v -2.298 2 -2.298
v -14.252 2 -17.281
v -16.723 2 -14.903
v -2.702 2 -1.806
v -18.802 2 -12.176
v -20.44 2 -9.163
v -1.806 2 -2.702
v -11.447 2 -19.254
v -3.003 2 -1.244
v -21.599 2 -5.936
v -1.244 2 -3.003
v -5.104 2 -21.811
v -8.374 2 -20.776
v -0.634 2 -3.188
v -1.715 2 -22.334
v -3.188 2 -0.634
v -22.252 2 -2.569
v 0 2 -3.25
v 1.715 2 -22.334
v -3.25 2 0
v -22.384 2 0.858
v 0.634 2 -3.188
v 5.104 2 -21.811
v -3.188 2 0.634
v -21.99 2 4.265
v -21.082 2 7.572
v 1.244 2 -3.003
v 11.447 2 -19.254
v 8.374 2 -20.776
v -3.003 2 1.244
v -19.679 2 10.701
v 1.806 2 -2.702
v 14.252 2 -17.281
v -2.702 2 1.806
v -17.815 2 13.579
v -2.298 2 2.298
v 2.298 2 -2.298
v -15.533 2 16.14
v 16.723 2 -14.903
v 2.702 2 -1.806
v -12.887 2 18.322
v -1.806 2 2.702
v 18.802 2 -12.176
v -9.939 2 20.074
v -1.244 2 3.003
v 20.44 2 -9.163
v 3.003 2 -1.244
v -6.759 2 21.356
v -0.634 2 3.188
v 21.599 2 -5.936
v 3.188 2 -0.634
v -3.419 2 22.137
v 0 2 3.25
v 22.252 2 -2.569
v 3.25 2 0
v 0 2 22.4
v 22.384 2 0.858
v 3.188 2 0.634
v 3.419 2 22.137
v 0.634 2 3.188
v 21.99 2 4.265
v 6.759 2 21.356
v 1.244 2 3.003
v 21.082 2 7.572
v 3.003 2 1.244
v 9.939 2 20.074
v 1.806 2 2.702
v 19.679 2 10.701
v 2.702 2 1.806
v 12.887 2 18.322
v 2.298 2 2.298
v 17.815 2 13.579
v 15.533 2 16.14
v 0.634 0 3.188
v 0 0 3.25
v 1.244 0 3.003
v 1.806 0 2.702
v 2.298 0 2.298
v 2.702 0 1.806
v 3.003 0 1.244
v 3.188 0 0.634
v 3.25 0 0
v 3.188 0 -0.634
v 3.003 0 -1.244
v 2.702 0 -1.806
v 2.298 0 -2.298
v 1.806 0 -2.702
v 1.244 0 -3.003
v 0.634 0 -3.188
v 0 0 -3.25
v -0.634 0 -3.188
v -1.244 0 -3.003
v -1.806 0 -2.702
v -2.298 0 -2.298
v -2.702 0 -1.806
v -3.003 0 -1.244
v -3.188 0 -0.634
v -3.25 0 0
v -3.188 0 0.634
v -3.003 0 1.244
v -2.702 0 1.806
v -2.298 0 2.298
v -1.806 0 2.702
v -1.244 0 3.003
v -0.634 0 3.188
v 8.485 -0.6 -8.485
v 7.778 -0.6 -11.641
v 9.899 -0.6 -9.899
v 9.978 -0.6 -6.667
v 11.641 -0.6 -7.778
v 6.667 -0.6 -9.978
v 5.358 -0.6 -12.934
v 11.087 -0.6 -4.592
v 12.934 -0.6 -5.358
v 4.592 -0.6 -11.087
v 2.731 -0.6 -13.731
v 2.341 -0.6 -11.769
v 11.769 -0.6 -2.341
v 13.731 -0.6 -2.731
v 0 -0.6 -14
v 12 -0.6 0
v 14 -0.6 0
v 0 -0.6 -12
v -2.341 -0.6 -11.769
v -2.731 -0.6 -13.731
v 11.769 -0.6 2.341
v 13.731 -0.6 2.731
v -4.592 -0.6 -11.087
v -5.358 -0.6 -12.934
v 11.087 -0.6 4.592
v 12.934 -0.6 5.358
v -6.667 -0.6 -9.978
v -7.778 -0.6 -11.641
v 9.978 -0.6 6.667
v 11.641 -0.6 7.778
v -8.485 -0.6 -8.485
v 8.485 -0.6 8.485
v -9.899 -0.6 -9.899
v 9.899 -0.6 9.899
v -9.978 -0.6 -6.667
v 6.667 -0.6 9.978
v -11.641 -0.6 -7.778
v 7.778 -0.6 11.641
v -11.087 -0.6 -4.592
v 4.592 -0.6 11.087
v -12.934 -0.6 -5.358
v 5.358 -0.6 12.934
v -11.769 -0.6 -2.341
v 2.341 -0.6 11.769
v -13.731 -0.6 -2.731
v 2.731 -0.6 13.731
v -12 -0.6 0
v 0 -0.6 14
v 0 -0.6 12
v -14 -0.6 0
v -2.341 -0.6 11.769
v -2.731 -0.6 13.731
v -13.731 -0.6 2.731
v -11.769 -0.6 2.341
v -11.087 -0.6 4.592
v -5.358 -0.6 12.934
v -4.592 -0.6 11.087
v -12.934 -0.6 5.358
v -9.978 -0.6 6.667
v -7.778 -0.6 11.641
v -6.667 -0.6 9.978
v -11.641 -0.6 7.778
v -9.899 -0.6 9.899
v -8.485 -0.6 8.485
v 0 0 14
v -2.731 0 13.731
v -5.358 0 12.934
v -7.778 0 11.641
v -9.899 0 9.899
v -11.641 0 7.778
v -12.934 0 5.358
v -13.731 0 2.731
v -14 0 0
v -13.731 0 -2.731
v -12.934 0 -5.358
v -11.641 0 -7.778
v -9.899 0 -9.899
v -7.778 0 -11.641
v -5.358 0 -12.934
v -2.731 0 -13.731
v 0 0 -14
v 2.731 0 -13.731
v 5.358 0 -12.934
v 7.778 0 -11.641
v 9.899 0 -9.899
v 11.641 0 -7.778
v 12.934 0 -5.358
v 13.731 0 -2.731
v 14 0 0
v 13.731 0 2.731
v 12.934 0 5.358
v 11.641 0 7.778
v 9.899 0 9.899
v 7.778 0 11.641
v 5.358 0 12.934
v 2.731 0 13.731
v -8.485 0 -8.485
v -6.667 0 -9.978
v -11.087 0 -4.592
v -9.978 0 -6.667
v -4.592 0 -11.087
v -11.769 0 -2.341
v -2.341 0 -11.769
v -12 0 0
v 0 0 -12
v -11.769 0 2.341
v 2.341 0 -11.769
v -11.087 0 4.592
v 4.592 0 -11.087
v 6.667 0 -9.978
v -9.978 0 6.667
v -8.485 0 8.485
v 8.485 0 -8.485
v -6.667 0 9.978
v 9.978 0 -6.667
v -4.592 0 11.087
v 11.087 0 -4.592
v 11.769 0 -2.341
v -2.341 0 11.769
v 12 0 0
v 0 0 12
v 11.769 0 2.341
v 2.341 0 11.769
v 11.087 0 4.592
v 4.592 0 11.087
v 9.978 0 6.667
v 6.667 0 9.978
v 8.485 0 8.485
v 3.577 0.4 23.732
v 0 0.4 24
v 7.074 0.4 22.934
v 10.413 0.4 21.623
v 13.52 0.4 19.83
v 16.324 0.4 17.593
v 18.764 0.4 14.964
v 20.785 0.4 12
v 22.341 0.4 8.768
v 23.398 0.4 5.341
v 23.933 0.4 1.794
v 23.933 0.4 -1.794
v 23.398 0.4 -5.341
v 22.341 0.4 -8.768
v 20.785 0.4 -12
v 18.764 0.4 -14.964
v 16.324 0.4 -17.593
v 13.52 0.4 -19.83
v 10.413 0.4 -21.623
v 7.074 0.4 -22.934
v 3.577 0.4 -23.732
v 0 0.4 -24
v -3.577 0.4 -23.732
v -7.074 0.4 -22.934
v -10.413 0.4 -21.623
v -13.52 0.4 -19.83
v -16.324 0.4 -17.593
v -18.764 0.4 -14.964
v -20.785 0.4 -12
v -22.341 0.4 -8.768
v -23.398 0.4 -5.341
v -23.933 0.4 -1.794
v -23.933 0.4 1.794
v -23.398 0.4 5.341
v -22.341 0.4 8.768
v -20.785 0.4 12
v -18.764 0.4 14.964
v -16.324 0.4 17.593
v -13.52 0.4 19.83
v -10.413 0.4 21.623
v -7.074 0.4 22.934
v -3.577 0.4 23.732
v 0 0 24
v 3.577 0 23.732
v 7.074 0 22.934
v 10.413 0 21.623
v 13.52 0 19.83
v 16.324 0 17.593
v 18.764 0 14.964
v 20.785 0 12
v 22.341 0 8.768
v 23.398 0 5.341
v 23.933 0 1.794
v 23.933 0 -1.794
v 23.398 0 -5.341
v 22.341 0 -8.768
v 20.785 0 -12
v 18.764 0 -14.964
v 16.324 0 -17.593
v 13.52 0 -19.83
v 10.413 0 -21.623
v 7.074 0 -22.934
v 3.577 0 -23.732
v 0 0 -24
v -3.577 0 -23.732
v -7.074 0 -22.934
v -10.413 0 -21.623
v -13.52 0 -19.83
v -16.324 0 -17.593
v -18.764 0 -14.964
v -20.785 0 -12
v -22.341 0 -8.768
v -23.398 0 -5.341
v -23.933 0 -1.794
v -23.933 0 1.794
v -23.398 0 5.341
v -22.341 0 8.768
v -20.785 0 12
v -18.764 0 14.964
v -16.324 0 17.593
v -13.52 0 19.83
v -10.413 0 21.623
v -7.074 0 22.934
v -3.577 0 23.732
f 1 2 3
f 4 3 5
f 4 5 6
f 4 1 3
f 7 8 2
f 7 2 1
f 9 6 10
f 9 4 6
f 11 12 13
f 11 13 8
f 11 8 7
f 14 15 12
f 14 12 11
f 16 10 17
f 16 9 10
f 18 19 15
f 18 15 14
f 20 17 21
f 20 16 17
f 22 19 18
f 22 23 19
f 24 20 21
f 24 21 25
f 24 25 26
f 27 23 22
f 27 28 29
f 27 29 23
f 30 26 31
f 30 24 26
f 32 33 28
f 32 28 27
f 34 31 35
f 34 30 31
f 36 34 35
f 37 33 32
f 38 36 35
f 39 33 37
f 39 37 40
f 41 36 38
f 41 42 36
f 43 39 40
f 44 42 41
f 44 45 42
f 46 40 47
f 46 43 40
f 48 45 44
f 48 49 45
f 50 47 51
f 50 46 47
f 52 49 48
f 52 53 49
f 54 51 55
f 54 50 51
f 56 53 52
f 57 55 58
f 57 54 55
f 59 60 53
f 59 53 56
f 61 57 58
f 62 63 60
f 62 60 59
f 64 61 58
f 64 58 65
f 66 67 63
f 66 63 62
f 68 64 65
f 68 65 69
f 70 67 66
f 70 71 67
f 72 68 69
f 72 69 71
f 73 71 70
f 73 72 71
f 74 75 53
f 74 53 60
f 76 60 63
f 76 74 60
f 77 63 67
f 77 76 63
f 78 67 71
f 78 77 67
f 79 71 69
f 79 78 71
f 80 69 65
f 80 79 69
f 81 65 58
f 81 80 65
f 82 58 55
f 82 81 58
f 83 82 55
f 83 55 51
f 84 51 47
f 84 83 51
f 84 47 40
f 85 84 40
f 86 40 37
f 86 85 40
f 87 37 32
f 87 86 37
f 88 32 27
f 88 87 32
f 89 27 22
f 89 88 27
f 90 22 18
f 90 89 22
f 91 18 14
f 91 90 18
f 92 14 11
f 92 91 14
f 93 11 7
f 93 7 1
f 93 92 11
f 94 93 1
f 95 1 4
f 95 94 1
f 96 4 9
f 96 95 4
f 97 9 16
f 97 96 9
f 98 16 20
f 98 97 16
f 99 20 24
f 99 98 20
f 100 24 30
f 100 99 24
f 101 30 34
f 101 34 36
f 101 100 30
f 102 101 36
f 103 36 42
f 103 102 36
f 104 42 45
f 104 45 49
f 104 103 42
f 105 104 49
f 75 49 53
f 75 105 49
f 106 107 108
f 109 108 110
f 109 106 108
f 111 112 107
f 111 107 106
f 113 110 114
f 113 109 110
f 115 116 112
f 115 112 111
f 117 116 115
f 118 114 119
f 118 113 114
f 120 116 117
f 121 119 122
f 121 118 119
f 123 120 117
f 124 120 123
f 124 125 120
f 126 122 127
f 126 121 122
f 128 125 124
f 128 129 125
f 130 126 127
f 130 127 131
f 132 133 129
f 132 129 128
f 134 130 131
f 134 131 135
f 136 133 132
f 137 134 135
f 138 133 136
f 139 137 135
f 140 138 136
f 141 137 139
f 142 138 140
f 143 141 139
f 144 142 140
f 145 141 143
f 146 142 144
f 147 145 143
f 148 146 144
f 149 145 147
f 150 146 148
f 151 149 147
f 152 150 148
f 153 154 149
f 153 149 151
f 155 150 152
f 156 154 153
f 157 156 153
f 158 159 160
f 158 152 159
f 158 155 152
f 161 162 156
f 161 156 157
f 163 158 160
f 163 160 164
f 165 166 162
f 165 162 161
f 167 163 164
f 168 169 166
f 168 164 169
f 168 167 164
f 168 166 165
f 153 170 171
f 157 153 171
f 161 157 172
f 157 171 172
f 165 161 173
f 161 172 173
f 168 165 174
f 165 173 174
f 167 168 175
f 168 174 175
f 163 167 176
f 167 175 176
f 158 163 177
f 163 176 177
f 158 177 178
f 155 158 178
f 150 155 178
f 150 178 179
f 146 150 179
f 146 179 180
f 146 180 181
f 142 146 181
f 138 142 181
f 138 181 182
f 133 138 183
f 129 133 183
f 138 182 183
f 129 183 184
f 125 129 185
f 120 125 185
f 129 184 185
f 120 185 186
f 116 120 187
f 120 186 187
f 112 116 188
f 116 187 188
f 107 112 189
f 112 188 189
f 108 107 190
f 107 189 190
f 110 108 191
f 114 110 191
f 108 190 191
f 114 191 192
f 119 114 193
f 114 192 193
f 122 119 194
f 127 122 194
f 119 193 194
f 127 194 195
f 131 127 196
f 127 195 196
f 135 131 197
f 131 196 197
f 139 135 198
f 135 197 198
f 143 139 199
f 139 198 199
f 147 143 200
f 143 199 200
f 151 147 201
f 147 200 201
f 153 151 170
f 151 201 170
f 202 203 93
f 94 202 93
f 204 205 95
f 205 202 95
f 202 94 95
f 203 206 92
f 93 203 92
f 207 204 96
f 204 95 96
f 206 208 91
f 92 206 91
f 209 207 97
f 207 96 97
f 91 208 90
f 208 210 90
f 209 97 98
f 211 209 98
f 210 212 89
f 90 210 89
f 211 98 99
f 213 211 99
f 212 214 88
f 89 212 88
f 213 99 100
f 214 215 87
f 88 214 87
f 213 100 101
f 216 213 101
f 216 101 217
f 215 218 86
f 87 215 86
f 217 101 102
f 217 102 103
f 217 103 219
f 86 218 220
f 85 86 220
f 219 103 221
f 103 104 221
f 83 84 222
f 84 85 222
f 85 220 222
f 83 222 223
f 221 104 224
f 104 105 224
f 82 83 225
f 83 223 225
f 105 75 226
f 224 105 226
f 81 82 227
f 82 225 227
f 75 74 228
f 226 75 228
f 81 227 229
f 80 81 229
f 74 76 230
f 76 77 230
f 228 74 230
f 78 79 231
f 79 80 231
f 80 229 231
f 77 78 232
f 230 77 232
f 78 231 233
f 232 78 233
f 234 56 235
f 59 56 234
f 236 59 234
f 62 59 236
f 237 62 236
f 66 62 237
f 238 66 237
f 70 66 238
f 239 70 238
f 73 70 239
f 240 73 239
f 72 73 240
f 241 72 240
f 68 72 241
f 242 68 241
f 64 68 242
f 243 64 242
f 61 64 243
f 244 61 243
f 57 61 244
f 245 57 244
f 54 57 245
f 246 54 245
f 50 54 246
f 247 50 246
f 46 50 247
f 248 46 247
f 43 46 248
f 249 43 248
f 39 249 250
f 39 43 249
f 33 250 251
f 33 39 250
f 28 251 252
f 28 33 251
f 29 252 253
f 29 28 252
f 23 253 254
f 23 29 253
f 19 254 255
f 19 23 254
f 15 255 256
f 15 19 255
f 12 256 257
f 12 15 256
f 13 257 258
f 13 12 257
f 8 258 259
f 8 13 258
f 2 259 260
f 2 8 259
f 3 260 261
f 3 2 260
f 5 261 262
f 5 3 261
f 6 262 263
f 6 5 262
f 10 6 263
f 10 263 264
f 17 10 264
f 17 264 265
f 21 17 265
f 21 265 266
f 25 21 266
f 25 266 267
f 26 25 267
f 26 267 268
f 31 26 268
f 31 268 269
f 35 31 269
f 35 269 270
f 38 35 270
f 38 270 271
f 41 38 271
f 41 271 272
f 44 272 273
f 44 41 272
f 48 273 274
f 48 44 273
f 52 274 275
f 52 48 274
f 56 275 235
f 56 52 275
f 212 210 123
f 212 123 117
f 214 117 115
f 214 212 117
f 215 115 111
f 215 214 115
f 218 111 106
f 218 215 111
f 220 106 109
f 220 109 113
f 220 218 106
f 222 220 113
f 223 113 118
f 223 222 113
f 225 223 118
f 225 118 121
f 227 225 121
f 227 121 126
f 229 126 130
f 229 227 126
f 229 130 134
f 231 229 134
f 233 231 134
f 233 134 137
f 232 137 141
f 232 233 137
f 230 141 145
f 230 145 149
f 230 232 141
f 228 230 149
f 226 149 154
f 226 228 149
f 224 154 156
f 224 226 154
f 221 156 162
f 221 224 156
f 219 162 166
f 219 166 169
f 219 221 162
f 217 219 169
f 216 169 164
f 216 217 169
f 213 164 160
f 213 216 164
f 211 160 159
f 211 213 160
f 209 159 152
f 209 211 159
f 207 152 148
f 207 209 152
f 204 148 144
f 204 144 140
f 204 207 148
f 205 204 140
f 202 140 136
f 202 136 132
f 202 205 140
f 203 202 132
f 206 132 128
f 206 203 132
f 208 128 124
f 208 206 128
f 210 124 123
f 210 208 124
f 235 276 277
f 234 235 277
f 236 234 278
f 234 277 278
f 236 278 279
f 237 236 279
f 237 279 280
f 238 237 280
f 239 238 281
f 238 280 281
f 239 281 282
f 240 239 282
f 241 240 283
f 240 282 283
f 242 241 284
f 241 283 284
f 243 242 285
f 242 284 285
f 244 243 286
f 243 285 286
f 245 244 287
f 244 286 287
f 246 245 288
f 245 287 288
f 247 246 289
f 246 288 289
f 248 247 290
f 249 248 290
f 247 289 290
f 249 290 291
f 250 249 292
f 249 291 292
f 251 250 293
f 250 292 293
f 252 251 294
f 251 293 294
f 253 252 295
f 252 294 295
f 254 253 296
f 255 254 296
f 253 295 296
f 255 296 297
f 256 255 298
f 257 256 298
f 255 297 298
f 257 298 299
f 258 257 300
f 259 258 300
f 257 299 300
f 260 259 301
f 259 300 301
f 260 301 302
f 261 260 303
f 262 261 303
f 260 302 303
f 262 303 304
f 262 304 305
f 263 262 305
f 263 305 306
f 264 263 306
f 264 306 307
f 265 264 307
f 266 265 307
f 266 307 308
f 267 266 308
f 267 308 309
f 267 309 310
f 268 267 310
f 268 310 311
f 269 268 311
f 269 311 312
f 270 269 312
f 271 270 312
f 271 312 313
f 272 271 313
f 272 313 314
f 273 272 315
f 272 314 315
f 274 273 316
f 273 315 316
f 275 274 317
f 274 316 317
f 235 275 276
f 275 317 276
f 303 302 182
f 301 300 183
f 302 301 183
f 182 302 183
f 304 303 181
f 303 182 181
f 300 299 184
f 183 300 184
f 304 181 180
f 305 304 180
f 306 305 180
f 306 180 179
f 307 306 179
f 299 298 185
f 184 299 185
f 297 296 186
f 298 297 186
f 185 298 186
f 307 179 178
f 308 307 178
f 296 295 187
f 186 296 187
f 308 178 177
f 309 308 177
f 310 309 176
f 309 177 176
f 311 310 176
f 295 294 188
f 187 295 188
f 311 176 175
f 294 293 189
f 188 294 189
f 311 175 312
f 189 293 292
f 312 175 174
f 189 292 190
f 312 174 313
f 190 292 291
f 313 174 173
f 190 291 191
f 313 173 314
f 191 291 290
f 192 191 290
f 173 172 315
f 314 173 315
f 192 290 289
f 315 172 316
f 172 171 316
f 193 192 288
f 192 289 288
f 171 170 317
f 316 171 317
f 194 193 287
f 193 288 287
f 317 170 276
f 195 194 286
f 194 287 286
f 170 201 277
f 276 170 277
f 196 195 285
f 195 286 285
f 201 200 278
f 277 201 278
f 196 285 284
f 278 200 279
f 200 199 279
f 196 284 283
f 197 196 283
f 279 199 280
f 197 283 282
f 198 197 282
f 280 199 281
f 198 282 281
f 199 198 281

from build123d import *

# Parameters (mm, degrees)
SKIZZE1_R                       = 24
SKIZZE1_R_2                     = 3.25
AUFSATZ_LINEAR_AUSTRAGEN1_DEPTH = 2
FASE1_SIZE                      = 1.6
SKIZZE2_R                       = 14
SKIZZE2_R_2                     = 12
AUFSATZ_LINEAR_AUSTRAGEN2_DEPTH = 0.6


with BuildPart() as part:
    # Skizze1 → Aufsatz-Linear austragen1 (new body)
    with BuildSketch(Plane(origin=(0, 0, 0), x_dir=(1, 0, 0), z_dir=(0, 1, 0))):
        with Locations(Location((0, 0, 0), (0, 0, 270))):
            Circle(SKIZZE1_R)
        with Locations(Location((0, 0, 0), (0, 0, 270))):
            Circle(SKIZZE1_R_2, mode=Mode.SUBTRACT)
    extrude(amount=AUFSATZ_LINEAR_AUSTRAGEN1_DEPTH)

    # Fase1
    fase1_edges = [part.edges().sort_by_distance(p)[0] for p in [
        (0, 2, -24),
    ]]
    chamfer(fase1_edges, length=FASE1_SIZE)

    # Skizze2 → Aufsatz-Linear austragen2 (add)
    with BuildSketch(Plane.XZ):
        with Locations(Location((0, 0, 0), (0, 0, 90))):
            Circle(SKIZZE2_R)
        with Locations(Location((0, 0, 0), (0, 0, 270))):
            Circle(SKIZZE2_R_2, mode=Mode.SUBTRACT)
    extrude(amount=AUFSATZ_LINEAR_AUSTRAGEN2_DEPTH)


solid = part.part
